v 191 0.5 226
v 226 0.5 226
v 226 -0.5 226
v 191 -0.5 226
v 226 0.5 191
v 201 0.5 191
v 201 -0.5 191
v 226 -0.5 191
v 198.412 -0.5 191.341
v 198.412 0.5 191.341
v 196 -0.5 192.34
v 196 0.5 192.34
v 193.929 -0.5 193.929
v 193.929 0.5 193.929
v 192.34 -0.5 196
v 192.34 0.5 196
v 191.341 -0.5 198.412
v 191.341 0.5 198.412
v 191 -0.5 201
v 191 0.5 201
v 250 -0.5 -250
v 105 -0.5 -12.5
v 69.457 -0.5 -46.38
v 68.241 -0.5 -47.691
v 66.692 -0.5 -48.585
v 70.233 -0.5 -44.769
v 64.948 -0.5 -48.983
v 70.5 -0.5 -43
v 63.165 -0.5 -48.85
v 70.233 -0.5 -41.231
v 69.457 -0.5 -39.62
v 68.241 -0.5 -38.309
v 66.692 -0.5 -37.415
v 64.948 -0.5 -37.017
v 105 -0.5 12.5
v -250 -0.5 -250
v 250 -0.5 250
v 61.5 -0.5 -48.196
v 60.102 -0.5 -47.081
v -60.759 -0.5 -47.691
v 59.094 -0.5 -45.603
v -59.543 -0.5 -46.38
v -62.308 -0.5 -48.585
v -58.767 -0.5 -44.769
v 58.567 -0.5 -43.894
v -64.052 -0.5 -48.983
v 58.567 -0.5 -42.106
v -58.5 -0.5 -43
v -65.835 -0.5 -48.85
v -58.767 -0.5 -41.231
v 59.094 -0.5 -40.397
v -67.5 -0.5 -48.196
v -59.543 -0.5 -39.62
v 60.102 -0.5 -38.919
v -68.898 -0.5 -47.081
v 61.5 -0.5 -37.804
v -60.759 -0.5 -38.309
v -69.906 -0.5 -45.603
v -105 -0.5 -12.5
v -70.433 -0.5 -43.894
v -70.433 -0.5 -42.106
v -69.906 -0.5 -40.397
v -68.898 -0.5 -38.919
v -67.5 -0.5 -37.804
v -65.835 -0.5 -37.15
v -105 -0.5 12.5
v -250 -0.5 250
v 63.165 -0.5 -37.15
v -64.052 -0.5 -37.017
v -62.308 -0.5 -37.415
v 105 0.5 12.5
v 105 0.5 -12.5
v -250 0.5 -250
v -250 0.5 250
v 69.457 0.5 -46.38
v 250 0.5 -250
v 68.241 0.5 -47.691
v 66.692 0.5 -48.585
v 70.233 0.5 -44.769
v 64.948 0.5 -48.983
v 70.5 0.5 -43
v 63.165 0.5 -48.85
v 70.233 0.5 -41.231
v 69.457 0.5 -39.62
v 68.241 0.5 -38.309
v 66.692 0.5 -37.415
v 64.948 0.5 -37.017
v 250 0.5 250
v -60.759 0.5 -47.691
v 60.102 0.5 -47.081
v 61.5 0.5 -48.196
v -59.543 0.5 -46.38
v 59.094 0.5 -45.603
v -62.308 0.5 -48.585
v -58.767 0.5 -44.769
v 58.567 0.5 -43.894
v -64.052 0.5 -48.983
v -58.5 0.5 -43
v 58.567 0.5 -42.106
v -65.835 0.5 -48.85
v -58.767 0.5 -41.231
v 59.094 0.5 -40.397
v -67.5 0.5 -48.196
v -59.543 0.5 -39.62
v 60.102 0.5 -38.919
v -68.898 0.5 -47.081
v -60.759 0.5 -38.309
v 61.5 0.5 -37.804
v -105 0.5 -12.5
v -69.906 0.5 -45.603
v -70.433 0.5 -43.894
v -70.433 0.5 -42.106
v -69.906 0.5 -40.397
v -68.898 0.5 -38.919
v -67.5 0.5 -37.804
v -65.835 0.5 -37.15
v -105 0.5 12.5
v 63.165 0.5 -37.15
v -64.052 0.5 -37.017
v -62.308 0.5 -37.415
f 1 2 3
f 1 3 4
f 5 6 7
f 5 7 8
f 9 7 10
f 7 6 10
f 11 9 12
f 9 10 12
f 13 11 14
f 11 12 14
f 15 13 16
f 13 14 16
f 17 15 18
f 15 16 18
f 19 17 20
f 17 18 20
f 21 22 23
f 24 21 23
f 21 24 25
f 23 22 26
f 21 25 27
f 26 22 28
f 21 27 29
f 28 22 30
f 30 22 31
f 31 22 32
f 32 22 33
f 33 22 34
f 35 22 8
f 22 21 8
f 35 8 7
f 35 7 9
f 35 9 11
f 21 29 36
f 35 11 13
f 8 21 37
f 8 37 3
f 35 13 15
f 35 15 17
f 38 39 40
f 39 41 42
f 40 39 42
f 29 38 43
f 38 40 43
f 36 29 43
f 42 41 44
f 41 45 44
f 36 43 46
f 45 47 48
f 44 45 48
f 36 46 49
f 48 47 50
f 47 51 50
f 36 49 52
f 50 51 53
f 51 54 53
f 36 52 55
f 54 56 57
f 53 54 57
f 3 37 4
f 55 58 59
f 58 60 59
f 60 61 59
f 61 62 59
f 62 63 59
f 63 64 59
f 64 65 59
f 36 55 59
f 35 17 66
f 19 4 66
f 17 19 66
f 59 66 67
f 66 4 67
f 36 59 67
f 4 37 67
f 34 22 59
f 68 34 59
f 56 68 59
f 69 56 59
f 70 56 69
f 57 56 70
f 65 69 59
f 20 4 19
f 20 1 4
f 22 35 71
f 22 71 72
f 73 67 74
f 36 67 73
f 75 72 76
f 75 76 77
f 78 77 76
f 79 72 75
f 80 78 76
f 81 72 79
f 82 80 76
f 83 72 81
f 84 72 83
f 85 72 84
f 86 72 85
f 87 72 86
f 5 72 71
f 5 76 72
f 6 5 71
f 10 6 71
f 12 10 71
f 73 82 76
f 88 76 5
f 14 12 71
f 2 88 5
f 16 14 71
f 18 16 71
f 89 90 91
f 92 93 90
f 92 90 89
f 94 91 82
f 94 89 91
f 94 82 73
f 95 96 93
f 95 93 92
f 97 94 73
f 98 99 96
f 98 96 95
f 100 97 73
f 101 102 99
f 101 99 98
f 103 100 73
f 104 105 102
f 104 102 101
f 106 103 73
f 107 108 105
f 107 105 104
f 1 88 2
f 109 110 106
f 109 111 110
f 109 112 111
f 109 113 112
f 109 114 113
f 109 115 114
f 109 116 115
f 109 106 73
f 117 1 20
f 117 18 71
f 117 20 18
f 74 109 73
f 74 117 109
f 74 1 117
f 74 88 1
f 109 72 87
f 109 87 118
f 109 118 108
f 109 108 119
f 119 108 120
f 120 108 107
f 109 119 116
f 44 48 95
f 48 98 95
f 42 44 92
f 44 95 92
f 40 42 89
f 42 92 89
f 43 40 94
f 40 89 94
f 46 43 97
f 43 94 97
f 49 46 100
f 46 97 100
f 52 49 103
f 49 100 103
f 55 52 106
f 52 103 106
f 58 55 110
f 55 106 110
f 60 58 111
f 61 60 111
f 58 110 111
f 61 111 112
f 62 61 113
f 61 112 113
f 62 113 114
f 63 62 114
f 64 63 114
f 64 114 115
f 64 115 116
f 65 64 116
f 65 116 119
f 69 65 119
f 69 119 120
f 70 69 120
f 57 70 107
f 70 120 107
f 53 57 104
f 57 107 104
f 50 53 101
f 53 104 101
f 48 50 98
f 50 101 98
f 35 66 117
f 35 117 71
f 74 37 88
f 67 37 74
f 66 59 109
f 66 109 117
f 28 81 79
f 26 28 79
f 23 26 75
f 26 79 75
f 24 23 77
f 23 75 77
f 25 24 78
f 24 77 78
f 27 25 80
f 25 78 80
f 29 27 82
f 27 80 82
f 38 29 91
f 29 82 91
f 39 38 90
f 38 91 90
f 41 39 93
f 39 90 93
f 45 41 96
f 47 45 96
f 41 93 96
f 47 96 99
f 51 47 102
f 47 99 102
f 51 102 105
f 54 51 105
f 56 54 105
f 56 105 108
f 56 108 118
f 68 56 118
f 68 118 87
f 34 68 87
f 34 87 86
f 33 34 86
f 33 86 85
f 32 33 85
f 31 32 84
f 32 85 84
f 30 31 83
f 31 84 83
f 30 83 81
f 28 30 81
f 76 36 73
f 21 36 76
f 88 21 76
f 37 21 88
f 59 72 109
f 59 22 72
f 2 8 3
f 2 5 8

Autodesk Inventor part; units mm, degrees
ref_plane "YZ Plane" through (0, 0, 0) normal (1, 0, 0) x (0, 1, 0)
ref_plane "XZ Plane" through (0, 0, 0) normal (0, 1, 0) x (-1, 0, 0)
ref_plane "XY Plane" through (0, 0, 0) normal (0, 0, 1) x (1, 0, 0)
sketch "Esboço1" plane through (0, 0, 0) normal (0, 1, 0) x (-1, 0, 0)
  line L0 (-250, 250) -> (250, 250)
  line L1 (250, 250) -> (250, -250)
  line L2 (250, -250) -> (-250, -250)
  line L3 (-250, -250) -> (-250, 250)
  line L4 (-250, 250) -> (250, -250) construction
  line L5 (250, 250) -> (-250, -250) construction
  point P0 (0, 0)
  dimension "d0" = 500
  dimension "d1" = 500
extrude "Extrusão1" add sketch "Esboço1" along normal mid plane 1
sketch "Esboço2" plane through (0, 0.5, 0) normal (0, 1, 0) x (1, 0, 0)
  line L0 (-105, -12.5) -> (105, -12.5)
  line L1 (105, -12.5) -> (105, 12.5)
  line L2 (105, 12.5) -> (-105, 12.5)
  line L3 (-105, 12.5) -> (-105, -12.5)
  line L4 (-105, -12.5) -> (105, 12.5) construction
  line L5 (105, -12.5) -> (-105, 12.5) construction
  point P0 (0, 0)
  dimension "d4" = 210
  dimension "d5" = 25
extrude "Extrusão2" cut sketch "Esboço2" along normal mid plane 42.75
sketch "Esboço6" plane through (0, 0.5, 0) normal (0, 1, 0) x (1, 0, 0)
  circle A0 centre (-64.5, 43) radius 6
  circle A1 centre (64.5, 43) radius 6
  line L0 (250, 250) -> (-250, 250) projected
  line L1 (-250, 250) -> (-250, -250) projected
  line L2 (-64.5, 43) -> (64.5, 43) construction
  line L3 (226, -226) -> (191, -226)
  line L4 (191, -226) -> (191, -201)
  line L5 (201, -191) -> (226, -191)
  line L6 (226, -191) -> (226, -226)
  line L7 (250, -250) -> (250, 250) projected
  line L8 (-250, -250) -> (250, -250) projected
  arc A2 (201, -191) -> (191, -201) centre (201, -201) ccw
  point P0 (0, 0)
  point P1 (191, -191)
  dimension "d33" = 12
  dimension "d34" = 12
  dimension "d35" = 207
  dimension "d36" = 185.5
  dimension "d37" = 129
  dimension "d38" = 35
  dimension "d39" = 35
  dimension "d40" = 24
  dimension "d41" = 24
  dimension "d42" = 10
extrude "Extrusão3" cut sketch "Esboço6" against normal up to surface (1 mm away) contours A0 | A1 | L3 L4 A2 L5 L6
properties part number "Chapa - aço galvanizado"
